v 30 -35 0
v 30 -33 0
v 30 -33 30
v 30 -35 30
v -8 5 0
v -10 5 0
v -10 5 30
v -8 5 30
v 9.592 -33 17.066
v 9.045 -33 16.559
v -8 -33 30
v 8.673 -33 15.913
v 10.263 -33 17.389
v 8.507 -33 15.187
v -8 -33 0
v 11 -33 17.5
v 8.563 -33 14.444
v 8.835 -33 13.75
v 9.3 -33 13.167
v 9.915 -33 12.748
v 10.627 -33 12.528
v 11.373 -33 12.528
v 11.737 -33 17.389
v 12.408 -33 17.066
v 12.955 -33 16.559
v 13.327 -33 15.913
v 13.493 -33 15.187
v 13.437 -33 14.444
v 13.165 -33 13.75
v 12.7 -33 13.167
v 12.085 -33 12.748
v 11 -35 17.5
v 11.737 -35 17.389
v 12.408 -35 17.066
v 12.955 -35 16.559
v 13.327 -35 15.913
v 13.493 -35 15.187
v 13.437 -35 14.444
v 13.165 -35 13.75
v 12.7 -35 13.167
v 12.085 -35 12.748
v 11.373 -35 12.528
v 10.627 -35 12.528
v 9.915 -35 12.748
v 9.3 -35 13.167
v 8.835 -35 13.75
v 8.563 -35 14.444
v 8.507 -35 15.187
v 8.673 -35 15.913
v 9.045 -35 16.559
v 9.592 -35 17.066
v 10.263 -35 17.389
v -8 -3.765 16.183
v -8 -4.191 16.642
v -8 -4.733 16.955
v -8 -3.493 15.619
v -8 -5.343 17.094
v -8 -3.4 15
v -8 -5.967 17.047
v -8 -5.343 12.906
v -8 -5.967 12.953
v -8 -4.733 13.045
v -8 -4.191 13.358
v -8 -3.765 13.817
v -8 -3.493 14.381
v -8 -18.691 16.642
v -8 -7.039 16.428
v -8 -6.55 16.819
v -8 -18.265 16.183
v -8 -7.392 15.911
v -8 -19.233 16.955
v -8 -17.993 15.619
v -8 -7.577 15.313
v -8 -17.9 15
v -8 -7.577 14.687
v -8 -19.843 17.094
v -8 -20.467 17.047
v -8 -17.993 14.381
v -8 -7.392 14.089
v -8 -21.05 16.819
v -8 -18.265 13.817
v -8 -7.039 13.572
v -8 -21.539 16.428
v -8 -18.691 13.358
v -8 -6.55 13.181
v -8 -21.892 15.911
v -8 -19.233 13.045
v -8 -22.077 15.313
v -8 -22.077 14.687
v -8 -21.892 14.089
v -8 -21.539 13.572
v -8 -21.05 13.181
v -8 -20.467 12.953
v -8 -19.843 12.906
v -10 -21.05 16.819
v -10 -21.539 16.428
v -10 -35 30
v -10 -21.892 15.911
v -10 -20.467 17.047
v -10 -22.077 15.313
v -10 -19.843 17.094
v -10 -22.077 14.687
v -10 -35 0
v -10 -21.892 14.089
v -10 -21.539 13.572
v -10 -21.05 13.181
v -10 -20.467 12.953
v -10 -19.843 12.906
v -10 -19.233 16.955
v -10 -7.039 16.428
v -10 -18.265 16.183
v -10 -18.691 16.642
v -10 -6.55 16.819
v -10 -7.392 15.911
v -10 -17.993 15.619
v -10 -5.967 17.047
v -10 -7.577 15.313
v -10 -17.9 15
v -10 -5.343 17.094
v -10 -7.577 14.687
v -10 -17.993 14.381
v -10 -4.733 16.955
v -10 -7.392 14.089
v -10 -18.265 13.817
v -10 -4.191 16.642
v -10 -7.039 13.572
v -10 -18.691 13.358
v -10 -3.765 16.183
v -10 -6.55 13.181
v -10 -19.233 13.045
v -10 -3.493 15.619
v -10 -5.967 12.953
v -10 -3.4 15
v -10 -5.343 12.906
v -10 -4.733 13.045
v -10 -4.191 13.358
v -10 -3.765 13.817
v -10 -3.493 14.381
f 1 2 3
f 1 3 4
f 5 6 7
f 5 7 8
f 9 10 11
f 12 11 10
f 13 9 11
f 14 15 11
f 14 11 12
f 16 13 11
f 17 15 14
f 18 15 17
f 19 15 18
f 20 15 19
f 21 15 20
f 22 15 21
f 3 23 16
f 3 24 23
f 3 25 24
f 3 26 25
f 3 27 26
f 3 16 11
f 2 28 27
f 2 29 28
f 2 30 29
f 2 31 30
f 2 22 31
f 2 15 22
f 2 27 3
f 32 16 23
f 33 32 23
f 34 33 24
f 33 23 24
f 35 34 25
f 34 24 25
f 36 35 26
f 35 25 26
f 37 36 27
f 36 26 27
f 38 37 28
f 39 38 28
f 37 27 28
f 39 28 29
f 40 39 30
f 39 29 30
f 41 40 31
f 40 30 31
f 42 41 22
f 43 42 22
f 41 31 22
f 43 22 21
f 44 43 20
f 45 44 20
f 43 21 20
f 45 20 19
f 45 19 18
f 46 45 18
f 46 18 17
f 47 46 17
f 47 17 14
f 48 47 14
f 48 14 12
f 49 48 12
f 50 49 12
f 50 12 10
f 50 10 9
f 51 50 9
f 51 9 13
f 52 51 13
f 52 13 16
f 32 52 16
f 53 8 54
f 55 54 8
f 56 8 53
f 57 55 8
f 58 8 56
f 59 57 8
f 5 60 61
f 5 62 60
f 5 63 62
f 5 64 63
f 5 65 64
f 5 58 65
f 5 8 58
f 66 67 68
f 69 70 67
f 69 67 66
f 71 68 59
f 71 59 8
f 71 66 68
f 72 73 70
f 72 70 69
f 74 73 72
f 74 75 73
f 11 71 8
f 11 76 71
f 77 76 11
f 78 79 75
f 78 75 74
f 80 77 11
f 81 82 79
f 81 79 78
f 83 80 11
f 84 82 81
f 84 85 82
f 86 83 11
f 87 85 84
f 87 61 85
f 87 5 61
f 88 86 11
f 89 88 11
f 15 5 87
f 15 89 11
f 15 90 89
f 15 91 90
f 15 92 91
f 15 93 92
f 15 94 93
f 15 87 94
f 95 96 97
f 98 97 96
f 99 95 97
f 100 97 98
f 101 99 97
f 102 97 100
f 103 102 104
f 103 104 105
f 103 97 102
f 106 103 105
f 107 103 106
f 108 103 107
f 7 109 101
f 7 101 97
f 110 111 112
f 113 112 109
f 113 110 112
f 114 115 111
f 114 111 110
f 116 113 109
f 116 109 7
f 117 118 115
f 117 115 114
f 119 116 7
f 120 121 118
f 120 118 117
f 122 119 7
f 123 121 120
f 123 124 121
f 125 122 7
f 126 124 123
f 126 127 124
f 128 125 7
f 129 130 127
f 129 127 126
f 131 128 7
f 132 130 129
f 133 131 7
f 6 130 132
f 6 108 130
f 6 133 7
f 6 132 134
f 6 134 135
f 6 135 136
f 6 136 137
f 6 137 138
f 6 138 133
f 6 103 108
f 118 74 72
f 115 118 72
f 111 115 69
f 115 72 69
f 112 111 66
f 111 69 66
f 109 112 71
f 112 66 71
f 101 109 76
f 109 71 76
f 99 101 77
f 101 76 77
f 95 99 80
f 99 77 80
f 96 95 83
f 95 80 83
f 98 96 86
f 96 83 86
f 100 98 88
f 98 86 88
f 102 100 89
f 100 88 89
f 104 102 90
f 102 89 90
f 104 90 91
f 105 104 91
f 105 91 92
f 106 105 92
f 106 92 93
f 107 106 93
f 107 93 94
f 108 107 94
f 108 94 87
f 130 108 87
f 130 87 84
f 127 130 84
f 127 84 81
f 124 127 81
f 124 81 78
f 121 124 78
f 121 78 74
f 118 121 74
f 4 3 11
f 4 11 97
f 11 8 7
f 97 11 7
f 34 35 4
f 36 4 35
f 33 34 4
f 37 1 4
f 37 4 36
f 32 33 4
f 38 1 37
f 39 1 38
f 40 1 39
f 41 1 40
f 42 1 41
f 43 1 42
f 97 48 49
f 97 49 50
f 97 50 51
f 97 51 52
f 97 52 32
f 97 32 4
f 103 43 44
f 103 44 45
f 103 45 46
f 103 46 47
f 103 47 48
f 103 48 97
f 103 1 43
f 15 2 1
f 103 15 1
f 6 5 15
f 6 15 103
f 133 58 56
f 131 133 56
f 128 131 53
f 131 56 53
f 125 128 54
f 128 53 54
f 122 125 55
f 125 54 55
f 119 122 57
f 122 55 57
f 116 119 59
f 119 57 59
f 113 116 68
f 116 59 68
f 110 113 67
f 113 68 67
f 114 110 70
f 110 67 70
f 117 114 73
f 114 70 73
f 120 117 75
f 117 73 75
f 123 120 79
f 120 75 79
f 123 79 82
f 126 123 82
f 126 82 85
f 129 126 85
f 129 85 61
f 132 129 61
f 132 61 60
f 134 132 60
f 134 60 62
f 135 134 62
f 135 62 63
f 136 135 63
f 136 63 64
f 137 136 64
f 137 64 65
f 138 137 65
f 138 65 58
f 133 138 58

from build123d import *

# Parameters (mm, degrees)
BOSS_EXTRUDE1_DEPTH = 30
SKETCH2_R           = 2.1
CUT_EXTRUDE1_DEPTH  = 30
SKETCH3_R           = 2.5
CUT_EXTRUDE2_DEPTH  = 10


with BuildPart() as part:
    # Sketch1 → Boss-Extrude1 (new body)
    with BuildSketch(Plane.XY):
        Polygon((-8, 5), (-8, -33), (30, -33), (30, -35), (-10, -35), (-10, 5), align=None)
    extrude(amount=BOSS_EXTRUDE1_DEPTH)

    # Sketch2 → Cut-Extrude1 (cut)
    with BuildSketch(Plane(origin=(-8, 0, 0), x_dir=(0, 0, -1), z_dir=(1, 0, 0))):
        with Locations(Location((-15, -5.5, 0), (0, 0, 90))):
            Circle(SKETCH2_R)
        with Locations(Location((-15, -20, 0), (0, 0, 90))):
            Circle(SKETCH2_R)
    extrude(amount=-CUT_EXTRUDE1_DEPTH, mode=Mode.SUBTRACT)

    # Sketch3 → Cut-Extrude2 (cut)
    with BuildSketch(Plane(origin=(0, -33, 0), x_dir=(1, 0, 0), z_dir=(0, 1, 0))):
        with Locations(Location((11, -15, 0), (0, 0, 270))):
            Circle(SKETCH3_R)
    extrude(amount=-CUT_EXTRUDE2_DEPTH, mode=Mode.SUBTRACT)


solid = part.part
